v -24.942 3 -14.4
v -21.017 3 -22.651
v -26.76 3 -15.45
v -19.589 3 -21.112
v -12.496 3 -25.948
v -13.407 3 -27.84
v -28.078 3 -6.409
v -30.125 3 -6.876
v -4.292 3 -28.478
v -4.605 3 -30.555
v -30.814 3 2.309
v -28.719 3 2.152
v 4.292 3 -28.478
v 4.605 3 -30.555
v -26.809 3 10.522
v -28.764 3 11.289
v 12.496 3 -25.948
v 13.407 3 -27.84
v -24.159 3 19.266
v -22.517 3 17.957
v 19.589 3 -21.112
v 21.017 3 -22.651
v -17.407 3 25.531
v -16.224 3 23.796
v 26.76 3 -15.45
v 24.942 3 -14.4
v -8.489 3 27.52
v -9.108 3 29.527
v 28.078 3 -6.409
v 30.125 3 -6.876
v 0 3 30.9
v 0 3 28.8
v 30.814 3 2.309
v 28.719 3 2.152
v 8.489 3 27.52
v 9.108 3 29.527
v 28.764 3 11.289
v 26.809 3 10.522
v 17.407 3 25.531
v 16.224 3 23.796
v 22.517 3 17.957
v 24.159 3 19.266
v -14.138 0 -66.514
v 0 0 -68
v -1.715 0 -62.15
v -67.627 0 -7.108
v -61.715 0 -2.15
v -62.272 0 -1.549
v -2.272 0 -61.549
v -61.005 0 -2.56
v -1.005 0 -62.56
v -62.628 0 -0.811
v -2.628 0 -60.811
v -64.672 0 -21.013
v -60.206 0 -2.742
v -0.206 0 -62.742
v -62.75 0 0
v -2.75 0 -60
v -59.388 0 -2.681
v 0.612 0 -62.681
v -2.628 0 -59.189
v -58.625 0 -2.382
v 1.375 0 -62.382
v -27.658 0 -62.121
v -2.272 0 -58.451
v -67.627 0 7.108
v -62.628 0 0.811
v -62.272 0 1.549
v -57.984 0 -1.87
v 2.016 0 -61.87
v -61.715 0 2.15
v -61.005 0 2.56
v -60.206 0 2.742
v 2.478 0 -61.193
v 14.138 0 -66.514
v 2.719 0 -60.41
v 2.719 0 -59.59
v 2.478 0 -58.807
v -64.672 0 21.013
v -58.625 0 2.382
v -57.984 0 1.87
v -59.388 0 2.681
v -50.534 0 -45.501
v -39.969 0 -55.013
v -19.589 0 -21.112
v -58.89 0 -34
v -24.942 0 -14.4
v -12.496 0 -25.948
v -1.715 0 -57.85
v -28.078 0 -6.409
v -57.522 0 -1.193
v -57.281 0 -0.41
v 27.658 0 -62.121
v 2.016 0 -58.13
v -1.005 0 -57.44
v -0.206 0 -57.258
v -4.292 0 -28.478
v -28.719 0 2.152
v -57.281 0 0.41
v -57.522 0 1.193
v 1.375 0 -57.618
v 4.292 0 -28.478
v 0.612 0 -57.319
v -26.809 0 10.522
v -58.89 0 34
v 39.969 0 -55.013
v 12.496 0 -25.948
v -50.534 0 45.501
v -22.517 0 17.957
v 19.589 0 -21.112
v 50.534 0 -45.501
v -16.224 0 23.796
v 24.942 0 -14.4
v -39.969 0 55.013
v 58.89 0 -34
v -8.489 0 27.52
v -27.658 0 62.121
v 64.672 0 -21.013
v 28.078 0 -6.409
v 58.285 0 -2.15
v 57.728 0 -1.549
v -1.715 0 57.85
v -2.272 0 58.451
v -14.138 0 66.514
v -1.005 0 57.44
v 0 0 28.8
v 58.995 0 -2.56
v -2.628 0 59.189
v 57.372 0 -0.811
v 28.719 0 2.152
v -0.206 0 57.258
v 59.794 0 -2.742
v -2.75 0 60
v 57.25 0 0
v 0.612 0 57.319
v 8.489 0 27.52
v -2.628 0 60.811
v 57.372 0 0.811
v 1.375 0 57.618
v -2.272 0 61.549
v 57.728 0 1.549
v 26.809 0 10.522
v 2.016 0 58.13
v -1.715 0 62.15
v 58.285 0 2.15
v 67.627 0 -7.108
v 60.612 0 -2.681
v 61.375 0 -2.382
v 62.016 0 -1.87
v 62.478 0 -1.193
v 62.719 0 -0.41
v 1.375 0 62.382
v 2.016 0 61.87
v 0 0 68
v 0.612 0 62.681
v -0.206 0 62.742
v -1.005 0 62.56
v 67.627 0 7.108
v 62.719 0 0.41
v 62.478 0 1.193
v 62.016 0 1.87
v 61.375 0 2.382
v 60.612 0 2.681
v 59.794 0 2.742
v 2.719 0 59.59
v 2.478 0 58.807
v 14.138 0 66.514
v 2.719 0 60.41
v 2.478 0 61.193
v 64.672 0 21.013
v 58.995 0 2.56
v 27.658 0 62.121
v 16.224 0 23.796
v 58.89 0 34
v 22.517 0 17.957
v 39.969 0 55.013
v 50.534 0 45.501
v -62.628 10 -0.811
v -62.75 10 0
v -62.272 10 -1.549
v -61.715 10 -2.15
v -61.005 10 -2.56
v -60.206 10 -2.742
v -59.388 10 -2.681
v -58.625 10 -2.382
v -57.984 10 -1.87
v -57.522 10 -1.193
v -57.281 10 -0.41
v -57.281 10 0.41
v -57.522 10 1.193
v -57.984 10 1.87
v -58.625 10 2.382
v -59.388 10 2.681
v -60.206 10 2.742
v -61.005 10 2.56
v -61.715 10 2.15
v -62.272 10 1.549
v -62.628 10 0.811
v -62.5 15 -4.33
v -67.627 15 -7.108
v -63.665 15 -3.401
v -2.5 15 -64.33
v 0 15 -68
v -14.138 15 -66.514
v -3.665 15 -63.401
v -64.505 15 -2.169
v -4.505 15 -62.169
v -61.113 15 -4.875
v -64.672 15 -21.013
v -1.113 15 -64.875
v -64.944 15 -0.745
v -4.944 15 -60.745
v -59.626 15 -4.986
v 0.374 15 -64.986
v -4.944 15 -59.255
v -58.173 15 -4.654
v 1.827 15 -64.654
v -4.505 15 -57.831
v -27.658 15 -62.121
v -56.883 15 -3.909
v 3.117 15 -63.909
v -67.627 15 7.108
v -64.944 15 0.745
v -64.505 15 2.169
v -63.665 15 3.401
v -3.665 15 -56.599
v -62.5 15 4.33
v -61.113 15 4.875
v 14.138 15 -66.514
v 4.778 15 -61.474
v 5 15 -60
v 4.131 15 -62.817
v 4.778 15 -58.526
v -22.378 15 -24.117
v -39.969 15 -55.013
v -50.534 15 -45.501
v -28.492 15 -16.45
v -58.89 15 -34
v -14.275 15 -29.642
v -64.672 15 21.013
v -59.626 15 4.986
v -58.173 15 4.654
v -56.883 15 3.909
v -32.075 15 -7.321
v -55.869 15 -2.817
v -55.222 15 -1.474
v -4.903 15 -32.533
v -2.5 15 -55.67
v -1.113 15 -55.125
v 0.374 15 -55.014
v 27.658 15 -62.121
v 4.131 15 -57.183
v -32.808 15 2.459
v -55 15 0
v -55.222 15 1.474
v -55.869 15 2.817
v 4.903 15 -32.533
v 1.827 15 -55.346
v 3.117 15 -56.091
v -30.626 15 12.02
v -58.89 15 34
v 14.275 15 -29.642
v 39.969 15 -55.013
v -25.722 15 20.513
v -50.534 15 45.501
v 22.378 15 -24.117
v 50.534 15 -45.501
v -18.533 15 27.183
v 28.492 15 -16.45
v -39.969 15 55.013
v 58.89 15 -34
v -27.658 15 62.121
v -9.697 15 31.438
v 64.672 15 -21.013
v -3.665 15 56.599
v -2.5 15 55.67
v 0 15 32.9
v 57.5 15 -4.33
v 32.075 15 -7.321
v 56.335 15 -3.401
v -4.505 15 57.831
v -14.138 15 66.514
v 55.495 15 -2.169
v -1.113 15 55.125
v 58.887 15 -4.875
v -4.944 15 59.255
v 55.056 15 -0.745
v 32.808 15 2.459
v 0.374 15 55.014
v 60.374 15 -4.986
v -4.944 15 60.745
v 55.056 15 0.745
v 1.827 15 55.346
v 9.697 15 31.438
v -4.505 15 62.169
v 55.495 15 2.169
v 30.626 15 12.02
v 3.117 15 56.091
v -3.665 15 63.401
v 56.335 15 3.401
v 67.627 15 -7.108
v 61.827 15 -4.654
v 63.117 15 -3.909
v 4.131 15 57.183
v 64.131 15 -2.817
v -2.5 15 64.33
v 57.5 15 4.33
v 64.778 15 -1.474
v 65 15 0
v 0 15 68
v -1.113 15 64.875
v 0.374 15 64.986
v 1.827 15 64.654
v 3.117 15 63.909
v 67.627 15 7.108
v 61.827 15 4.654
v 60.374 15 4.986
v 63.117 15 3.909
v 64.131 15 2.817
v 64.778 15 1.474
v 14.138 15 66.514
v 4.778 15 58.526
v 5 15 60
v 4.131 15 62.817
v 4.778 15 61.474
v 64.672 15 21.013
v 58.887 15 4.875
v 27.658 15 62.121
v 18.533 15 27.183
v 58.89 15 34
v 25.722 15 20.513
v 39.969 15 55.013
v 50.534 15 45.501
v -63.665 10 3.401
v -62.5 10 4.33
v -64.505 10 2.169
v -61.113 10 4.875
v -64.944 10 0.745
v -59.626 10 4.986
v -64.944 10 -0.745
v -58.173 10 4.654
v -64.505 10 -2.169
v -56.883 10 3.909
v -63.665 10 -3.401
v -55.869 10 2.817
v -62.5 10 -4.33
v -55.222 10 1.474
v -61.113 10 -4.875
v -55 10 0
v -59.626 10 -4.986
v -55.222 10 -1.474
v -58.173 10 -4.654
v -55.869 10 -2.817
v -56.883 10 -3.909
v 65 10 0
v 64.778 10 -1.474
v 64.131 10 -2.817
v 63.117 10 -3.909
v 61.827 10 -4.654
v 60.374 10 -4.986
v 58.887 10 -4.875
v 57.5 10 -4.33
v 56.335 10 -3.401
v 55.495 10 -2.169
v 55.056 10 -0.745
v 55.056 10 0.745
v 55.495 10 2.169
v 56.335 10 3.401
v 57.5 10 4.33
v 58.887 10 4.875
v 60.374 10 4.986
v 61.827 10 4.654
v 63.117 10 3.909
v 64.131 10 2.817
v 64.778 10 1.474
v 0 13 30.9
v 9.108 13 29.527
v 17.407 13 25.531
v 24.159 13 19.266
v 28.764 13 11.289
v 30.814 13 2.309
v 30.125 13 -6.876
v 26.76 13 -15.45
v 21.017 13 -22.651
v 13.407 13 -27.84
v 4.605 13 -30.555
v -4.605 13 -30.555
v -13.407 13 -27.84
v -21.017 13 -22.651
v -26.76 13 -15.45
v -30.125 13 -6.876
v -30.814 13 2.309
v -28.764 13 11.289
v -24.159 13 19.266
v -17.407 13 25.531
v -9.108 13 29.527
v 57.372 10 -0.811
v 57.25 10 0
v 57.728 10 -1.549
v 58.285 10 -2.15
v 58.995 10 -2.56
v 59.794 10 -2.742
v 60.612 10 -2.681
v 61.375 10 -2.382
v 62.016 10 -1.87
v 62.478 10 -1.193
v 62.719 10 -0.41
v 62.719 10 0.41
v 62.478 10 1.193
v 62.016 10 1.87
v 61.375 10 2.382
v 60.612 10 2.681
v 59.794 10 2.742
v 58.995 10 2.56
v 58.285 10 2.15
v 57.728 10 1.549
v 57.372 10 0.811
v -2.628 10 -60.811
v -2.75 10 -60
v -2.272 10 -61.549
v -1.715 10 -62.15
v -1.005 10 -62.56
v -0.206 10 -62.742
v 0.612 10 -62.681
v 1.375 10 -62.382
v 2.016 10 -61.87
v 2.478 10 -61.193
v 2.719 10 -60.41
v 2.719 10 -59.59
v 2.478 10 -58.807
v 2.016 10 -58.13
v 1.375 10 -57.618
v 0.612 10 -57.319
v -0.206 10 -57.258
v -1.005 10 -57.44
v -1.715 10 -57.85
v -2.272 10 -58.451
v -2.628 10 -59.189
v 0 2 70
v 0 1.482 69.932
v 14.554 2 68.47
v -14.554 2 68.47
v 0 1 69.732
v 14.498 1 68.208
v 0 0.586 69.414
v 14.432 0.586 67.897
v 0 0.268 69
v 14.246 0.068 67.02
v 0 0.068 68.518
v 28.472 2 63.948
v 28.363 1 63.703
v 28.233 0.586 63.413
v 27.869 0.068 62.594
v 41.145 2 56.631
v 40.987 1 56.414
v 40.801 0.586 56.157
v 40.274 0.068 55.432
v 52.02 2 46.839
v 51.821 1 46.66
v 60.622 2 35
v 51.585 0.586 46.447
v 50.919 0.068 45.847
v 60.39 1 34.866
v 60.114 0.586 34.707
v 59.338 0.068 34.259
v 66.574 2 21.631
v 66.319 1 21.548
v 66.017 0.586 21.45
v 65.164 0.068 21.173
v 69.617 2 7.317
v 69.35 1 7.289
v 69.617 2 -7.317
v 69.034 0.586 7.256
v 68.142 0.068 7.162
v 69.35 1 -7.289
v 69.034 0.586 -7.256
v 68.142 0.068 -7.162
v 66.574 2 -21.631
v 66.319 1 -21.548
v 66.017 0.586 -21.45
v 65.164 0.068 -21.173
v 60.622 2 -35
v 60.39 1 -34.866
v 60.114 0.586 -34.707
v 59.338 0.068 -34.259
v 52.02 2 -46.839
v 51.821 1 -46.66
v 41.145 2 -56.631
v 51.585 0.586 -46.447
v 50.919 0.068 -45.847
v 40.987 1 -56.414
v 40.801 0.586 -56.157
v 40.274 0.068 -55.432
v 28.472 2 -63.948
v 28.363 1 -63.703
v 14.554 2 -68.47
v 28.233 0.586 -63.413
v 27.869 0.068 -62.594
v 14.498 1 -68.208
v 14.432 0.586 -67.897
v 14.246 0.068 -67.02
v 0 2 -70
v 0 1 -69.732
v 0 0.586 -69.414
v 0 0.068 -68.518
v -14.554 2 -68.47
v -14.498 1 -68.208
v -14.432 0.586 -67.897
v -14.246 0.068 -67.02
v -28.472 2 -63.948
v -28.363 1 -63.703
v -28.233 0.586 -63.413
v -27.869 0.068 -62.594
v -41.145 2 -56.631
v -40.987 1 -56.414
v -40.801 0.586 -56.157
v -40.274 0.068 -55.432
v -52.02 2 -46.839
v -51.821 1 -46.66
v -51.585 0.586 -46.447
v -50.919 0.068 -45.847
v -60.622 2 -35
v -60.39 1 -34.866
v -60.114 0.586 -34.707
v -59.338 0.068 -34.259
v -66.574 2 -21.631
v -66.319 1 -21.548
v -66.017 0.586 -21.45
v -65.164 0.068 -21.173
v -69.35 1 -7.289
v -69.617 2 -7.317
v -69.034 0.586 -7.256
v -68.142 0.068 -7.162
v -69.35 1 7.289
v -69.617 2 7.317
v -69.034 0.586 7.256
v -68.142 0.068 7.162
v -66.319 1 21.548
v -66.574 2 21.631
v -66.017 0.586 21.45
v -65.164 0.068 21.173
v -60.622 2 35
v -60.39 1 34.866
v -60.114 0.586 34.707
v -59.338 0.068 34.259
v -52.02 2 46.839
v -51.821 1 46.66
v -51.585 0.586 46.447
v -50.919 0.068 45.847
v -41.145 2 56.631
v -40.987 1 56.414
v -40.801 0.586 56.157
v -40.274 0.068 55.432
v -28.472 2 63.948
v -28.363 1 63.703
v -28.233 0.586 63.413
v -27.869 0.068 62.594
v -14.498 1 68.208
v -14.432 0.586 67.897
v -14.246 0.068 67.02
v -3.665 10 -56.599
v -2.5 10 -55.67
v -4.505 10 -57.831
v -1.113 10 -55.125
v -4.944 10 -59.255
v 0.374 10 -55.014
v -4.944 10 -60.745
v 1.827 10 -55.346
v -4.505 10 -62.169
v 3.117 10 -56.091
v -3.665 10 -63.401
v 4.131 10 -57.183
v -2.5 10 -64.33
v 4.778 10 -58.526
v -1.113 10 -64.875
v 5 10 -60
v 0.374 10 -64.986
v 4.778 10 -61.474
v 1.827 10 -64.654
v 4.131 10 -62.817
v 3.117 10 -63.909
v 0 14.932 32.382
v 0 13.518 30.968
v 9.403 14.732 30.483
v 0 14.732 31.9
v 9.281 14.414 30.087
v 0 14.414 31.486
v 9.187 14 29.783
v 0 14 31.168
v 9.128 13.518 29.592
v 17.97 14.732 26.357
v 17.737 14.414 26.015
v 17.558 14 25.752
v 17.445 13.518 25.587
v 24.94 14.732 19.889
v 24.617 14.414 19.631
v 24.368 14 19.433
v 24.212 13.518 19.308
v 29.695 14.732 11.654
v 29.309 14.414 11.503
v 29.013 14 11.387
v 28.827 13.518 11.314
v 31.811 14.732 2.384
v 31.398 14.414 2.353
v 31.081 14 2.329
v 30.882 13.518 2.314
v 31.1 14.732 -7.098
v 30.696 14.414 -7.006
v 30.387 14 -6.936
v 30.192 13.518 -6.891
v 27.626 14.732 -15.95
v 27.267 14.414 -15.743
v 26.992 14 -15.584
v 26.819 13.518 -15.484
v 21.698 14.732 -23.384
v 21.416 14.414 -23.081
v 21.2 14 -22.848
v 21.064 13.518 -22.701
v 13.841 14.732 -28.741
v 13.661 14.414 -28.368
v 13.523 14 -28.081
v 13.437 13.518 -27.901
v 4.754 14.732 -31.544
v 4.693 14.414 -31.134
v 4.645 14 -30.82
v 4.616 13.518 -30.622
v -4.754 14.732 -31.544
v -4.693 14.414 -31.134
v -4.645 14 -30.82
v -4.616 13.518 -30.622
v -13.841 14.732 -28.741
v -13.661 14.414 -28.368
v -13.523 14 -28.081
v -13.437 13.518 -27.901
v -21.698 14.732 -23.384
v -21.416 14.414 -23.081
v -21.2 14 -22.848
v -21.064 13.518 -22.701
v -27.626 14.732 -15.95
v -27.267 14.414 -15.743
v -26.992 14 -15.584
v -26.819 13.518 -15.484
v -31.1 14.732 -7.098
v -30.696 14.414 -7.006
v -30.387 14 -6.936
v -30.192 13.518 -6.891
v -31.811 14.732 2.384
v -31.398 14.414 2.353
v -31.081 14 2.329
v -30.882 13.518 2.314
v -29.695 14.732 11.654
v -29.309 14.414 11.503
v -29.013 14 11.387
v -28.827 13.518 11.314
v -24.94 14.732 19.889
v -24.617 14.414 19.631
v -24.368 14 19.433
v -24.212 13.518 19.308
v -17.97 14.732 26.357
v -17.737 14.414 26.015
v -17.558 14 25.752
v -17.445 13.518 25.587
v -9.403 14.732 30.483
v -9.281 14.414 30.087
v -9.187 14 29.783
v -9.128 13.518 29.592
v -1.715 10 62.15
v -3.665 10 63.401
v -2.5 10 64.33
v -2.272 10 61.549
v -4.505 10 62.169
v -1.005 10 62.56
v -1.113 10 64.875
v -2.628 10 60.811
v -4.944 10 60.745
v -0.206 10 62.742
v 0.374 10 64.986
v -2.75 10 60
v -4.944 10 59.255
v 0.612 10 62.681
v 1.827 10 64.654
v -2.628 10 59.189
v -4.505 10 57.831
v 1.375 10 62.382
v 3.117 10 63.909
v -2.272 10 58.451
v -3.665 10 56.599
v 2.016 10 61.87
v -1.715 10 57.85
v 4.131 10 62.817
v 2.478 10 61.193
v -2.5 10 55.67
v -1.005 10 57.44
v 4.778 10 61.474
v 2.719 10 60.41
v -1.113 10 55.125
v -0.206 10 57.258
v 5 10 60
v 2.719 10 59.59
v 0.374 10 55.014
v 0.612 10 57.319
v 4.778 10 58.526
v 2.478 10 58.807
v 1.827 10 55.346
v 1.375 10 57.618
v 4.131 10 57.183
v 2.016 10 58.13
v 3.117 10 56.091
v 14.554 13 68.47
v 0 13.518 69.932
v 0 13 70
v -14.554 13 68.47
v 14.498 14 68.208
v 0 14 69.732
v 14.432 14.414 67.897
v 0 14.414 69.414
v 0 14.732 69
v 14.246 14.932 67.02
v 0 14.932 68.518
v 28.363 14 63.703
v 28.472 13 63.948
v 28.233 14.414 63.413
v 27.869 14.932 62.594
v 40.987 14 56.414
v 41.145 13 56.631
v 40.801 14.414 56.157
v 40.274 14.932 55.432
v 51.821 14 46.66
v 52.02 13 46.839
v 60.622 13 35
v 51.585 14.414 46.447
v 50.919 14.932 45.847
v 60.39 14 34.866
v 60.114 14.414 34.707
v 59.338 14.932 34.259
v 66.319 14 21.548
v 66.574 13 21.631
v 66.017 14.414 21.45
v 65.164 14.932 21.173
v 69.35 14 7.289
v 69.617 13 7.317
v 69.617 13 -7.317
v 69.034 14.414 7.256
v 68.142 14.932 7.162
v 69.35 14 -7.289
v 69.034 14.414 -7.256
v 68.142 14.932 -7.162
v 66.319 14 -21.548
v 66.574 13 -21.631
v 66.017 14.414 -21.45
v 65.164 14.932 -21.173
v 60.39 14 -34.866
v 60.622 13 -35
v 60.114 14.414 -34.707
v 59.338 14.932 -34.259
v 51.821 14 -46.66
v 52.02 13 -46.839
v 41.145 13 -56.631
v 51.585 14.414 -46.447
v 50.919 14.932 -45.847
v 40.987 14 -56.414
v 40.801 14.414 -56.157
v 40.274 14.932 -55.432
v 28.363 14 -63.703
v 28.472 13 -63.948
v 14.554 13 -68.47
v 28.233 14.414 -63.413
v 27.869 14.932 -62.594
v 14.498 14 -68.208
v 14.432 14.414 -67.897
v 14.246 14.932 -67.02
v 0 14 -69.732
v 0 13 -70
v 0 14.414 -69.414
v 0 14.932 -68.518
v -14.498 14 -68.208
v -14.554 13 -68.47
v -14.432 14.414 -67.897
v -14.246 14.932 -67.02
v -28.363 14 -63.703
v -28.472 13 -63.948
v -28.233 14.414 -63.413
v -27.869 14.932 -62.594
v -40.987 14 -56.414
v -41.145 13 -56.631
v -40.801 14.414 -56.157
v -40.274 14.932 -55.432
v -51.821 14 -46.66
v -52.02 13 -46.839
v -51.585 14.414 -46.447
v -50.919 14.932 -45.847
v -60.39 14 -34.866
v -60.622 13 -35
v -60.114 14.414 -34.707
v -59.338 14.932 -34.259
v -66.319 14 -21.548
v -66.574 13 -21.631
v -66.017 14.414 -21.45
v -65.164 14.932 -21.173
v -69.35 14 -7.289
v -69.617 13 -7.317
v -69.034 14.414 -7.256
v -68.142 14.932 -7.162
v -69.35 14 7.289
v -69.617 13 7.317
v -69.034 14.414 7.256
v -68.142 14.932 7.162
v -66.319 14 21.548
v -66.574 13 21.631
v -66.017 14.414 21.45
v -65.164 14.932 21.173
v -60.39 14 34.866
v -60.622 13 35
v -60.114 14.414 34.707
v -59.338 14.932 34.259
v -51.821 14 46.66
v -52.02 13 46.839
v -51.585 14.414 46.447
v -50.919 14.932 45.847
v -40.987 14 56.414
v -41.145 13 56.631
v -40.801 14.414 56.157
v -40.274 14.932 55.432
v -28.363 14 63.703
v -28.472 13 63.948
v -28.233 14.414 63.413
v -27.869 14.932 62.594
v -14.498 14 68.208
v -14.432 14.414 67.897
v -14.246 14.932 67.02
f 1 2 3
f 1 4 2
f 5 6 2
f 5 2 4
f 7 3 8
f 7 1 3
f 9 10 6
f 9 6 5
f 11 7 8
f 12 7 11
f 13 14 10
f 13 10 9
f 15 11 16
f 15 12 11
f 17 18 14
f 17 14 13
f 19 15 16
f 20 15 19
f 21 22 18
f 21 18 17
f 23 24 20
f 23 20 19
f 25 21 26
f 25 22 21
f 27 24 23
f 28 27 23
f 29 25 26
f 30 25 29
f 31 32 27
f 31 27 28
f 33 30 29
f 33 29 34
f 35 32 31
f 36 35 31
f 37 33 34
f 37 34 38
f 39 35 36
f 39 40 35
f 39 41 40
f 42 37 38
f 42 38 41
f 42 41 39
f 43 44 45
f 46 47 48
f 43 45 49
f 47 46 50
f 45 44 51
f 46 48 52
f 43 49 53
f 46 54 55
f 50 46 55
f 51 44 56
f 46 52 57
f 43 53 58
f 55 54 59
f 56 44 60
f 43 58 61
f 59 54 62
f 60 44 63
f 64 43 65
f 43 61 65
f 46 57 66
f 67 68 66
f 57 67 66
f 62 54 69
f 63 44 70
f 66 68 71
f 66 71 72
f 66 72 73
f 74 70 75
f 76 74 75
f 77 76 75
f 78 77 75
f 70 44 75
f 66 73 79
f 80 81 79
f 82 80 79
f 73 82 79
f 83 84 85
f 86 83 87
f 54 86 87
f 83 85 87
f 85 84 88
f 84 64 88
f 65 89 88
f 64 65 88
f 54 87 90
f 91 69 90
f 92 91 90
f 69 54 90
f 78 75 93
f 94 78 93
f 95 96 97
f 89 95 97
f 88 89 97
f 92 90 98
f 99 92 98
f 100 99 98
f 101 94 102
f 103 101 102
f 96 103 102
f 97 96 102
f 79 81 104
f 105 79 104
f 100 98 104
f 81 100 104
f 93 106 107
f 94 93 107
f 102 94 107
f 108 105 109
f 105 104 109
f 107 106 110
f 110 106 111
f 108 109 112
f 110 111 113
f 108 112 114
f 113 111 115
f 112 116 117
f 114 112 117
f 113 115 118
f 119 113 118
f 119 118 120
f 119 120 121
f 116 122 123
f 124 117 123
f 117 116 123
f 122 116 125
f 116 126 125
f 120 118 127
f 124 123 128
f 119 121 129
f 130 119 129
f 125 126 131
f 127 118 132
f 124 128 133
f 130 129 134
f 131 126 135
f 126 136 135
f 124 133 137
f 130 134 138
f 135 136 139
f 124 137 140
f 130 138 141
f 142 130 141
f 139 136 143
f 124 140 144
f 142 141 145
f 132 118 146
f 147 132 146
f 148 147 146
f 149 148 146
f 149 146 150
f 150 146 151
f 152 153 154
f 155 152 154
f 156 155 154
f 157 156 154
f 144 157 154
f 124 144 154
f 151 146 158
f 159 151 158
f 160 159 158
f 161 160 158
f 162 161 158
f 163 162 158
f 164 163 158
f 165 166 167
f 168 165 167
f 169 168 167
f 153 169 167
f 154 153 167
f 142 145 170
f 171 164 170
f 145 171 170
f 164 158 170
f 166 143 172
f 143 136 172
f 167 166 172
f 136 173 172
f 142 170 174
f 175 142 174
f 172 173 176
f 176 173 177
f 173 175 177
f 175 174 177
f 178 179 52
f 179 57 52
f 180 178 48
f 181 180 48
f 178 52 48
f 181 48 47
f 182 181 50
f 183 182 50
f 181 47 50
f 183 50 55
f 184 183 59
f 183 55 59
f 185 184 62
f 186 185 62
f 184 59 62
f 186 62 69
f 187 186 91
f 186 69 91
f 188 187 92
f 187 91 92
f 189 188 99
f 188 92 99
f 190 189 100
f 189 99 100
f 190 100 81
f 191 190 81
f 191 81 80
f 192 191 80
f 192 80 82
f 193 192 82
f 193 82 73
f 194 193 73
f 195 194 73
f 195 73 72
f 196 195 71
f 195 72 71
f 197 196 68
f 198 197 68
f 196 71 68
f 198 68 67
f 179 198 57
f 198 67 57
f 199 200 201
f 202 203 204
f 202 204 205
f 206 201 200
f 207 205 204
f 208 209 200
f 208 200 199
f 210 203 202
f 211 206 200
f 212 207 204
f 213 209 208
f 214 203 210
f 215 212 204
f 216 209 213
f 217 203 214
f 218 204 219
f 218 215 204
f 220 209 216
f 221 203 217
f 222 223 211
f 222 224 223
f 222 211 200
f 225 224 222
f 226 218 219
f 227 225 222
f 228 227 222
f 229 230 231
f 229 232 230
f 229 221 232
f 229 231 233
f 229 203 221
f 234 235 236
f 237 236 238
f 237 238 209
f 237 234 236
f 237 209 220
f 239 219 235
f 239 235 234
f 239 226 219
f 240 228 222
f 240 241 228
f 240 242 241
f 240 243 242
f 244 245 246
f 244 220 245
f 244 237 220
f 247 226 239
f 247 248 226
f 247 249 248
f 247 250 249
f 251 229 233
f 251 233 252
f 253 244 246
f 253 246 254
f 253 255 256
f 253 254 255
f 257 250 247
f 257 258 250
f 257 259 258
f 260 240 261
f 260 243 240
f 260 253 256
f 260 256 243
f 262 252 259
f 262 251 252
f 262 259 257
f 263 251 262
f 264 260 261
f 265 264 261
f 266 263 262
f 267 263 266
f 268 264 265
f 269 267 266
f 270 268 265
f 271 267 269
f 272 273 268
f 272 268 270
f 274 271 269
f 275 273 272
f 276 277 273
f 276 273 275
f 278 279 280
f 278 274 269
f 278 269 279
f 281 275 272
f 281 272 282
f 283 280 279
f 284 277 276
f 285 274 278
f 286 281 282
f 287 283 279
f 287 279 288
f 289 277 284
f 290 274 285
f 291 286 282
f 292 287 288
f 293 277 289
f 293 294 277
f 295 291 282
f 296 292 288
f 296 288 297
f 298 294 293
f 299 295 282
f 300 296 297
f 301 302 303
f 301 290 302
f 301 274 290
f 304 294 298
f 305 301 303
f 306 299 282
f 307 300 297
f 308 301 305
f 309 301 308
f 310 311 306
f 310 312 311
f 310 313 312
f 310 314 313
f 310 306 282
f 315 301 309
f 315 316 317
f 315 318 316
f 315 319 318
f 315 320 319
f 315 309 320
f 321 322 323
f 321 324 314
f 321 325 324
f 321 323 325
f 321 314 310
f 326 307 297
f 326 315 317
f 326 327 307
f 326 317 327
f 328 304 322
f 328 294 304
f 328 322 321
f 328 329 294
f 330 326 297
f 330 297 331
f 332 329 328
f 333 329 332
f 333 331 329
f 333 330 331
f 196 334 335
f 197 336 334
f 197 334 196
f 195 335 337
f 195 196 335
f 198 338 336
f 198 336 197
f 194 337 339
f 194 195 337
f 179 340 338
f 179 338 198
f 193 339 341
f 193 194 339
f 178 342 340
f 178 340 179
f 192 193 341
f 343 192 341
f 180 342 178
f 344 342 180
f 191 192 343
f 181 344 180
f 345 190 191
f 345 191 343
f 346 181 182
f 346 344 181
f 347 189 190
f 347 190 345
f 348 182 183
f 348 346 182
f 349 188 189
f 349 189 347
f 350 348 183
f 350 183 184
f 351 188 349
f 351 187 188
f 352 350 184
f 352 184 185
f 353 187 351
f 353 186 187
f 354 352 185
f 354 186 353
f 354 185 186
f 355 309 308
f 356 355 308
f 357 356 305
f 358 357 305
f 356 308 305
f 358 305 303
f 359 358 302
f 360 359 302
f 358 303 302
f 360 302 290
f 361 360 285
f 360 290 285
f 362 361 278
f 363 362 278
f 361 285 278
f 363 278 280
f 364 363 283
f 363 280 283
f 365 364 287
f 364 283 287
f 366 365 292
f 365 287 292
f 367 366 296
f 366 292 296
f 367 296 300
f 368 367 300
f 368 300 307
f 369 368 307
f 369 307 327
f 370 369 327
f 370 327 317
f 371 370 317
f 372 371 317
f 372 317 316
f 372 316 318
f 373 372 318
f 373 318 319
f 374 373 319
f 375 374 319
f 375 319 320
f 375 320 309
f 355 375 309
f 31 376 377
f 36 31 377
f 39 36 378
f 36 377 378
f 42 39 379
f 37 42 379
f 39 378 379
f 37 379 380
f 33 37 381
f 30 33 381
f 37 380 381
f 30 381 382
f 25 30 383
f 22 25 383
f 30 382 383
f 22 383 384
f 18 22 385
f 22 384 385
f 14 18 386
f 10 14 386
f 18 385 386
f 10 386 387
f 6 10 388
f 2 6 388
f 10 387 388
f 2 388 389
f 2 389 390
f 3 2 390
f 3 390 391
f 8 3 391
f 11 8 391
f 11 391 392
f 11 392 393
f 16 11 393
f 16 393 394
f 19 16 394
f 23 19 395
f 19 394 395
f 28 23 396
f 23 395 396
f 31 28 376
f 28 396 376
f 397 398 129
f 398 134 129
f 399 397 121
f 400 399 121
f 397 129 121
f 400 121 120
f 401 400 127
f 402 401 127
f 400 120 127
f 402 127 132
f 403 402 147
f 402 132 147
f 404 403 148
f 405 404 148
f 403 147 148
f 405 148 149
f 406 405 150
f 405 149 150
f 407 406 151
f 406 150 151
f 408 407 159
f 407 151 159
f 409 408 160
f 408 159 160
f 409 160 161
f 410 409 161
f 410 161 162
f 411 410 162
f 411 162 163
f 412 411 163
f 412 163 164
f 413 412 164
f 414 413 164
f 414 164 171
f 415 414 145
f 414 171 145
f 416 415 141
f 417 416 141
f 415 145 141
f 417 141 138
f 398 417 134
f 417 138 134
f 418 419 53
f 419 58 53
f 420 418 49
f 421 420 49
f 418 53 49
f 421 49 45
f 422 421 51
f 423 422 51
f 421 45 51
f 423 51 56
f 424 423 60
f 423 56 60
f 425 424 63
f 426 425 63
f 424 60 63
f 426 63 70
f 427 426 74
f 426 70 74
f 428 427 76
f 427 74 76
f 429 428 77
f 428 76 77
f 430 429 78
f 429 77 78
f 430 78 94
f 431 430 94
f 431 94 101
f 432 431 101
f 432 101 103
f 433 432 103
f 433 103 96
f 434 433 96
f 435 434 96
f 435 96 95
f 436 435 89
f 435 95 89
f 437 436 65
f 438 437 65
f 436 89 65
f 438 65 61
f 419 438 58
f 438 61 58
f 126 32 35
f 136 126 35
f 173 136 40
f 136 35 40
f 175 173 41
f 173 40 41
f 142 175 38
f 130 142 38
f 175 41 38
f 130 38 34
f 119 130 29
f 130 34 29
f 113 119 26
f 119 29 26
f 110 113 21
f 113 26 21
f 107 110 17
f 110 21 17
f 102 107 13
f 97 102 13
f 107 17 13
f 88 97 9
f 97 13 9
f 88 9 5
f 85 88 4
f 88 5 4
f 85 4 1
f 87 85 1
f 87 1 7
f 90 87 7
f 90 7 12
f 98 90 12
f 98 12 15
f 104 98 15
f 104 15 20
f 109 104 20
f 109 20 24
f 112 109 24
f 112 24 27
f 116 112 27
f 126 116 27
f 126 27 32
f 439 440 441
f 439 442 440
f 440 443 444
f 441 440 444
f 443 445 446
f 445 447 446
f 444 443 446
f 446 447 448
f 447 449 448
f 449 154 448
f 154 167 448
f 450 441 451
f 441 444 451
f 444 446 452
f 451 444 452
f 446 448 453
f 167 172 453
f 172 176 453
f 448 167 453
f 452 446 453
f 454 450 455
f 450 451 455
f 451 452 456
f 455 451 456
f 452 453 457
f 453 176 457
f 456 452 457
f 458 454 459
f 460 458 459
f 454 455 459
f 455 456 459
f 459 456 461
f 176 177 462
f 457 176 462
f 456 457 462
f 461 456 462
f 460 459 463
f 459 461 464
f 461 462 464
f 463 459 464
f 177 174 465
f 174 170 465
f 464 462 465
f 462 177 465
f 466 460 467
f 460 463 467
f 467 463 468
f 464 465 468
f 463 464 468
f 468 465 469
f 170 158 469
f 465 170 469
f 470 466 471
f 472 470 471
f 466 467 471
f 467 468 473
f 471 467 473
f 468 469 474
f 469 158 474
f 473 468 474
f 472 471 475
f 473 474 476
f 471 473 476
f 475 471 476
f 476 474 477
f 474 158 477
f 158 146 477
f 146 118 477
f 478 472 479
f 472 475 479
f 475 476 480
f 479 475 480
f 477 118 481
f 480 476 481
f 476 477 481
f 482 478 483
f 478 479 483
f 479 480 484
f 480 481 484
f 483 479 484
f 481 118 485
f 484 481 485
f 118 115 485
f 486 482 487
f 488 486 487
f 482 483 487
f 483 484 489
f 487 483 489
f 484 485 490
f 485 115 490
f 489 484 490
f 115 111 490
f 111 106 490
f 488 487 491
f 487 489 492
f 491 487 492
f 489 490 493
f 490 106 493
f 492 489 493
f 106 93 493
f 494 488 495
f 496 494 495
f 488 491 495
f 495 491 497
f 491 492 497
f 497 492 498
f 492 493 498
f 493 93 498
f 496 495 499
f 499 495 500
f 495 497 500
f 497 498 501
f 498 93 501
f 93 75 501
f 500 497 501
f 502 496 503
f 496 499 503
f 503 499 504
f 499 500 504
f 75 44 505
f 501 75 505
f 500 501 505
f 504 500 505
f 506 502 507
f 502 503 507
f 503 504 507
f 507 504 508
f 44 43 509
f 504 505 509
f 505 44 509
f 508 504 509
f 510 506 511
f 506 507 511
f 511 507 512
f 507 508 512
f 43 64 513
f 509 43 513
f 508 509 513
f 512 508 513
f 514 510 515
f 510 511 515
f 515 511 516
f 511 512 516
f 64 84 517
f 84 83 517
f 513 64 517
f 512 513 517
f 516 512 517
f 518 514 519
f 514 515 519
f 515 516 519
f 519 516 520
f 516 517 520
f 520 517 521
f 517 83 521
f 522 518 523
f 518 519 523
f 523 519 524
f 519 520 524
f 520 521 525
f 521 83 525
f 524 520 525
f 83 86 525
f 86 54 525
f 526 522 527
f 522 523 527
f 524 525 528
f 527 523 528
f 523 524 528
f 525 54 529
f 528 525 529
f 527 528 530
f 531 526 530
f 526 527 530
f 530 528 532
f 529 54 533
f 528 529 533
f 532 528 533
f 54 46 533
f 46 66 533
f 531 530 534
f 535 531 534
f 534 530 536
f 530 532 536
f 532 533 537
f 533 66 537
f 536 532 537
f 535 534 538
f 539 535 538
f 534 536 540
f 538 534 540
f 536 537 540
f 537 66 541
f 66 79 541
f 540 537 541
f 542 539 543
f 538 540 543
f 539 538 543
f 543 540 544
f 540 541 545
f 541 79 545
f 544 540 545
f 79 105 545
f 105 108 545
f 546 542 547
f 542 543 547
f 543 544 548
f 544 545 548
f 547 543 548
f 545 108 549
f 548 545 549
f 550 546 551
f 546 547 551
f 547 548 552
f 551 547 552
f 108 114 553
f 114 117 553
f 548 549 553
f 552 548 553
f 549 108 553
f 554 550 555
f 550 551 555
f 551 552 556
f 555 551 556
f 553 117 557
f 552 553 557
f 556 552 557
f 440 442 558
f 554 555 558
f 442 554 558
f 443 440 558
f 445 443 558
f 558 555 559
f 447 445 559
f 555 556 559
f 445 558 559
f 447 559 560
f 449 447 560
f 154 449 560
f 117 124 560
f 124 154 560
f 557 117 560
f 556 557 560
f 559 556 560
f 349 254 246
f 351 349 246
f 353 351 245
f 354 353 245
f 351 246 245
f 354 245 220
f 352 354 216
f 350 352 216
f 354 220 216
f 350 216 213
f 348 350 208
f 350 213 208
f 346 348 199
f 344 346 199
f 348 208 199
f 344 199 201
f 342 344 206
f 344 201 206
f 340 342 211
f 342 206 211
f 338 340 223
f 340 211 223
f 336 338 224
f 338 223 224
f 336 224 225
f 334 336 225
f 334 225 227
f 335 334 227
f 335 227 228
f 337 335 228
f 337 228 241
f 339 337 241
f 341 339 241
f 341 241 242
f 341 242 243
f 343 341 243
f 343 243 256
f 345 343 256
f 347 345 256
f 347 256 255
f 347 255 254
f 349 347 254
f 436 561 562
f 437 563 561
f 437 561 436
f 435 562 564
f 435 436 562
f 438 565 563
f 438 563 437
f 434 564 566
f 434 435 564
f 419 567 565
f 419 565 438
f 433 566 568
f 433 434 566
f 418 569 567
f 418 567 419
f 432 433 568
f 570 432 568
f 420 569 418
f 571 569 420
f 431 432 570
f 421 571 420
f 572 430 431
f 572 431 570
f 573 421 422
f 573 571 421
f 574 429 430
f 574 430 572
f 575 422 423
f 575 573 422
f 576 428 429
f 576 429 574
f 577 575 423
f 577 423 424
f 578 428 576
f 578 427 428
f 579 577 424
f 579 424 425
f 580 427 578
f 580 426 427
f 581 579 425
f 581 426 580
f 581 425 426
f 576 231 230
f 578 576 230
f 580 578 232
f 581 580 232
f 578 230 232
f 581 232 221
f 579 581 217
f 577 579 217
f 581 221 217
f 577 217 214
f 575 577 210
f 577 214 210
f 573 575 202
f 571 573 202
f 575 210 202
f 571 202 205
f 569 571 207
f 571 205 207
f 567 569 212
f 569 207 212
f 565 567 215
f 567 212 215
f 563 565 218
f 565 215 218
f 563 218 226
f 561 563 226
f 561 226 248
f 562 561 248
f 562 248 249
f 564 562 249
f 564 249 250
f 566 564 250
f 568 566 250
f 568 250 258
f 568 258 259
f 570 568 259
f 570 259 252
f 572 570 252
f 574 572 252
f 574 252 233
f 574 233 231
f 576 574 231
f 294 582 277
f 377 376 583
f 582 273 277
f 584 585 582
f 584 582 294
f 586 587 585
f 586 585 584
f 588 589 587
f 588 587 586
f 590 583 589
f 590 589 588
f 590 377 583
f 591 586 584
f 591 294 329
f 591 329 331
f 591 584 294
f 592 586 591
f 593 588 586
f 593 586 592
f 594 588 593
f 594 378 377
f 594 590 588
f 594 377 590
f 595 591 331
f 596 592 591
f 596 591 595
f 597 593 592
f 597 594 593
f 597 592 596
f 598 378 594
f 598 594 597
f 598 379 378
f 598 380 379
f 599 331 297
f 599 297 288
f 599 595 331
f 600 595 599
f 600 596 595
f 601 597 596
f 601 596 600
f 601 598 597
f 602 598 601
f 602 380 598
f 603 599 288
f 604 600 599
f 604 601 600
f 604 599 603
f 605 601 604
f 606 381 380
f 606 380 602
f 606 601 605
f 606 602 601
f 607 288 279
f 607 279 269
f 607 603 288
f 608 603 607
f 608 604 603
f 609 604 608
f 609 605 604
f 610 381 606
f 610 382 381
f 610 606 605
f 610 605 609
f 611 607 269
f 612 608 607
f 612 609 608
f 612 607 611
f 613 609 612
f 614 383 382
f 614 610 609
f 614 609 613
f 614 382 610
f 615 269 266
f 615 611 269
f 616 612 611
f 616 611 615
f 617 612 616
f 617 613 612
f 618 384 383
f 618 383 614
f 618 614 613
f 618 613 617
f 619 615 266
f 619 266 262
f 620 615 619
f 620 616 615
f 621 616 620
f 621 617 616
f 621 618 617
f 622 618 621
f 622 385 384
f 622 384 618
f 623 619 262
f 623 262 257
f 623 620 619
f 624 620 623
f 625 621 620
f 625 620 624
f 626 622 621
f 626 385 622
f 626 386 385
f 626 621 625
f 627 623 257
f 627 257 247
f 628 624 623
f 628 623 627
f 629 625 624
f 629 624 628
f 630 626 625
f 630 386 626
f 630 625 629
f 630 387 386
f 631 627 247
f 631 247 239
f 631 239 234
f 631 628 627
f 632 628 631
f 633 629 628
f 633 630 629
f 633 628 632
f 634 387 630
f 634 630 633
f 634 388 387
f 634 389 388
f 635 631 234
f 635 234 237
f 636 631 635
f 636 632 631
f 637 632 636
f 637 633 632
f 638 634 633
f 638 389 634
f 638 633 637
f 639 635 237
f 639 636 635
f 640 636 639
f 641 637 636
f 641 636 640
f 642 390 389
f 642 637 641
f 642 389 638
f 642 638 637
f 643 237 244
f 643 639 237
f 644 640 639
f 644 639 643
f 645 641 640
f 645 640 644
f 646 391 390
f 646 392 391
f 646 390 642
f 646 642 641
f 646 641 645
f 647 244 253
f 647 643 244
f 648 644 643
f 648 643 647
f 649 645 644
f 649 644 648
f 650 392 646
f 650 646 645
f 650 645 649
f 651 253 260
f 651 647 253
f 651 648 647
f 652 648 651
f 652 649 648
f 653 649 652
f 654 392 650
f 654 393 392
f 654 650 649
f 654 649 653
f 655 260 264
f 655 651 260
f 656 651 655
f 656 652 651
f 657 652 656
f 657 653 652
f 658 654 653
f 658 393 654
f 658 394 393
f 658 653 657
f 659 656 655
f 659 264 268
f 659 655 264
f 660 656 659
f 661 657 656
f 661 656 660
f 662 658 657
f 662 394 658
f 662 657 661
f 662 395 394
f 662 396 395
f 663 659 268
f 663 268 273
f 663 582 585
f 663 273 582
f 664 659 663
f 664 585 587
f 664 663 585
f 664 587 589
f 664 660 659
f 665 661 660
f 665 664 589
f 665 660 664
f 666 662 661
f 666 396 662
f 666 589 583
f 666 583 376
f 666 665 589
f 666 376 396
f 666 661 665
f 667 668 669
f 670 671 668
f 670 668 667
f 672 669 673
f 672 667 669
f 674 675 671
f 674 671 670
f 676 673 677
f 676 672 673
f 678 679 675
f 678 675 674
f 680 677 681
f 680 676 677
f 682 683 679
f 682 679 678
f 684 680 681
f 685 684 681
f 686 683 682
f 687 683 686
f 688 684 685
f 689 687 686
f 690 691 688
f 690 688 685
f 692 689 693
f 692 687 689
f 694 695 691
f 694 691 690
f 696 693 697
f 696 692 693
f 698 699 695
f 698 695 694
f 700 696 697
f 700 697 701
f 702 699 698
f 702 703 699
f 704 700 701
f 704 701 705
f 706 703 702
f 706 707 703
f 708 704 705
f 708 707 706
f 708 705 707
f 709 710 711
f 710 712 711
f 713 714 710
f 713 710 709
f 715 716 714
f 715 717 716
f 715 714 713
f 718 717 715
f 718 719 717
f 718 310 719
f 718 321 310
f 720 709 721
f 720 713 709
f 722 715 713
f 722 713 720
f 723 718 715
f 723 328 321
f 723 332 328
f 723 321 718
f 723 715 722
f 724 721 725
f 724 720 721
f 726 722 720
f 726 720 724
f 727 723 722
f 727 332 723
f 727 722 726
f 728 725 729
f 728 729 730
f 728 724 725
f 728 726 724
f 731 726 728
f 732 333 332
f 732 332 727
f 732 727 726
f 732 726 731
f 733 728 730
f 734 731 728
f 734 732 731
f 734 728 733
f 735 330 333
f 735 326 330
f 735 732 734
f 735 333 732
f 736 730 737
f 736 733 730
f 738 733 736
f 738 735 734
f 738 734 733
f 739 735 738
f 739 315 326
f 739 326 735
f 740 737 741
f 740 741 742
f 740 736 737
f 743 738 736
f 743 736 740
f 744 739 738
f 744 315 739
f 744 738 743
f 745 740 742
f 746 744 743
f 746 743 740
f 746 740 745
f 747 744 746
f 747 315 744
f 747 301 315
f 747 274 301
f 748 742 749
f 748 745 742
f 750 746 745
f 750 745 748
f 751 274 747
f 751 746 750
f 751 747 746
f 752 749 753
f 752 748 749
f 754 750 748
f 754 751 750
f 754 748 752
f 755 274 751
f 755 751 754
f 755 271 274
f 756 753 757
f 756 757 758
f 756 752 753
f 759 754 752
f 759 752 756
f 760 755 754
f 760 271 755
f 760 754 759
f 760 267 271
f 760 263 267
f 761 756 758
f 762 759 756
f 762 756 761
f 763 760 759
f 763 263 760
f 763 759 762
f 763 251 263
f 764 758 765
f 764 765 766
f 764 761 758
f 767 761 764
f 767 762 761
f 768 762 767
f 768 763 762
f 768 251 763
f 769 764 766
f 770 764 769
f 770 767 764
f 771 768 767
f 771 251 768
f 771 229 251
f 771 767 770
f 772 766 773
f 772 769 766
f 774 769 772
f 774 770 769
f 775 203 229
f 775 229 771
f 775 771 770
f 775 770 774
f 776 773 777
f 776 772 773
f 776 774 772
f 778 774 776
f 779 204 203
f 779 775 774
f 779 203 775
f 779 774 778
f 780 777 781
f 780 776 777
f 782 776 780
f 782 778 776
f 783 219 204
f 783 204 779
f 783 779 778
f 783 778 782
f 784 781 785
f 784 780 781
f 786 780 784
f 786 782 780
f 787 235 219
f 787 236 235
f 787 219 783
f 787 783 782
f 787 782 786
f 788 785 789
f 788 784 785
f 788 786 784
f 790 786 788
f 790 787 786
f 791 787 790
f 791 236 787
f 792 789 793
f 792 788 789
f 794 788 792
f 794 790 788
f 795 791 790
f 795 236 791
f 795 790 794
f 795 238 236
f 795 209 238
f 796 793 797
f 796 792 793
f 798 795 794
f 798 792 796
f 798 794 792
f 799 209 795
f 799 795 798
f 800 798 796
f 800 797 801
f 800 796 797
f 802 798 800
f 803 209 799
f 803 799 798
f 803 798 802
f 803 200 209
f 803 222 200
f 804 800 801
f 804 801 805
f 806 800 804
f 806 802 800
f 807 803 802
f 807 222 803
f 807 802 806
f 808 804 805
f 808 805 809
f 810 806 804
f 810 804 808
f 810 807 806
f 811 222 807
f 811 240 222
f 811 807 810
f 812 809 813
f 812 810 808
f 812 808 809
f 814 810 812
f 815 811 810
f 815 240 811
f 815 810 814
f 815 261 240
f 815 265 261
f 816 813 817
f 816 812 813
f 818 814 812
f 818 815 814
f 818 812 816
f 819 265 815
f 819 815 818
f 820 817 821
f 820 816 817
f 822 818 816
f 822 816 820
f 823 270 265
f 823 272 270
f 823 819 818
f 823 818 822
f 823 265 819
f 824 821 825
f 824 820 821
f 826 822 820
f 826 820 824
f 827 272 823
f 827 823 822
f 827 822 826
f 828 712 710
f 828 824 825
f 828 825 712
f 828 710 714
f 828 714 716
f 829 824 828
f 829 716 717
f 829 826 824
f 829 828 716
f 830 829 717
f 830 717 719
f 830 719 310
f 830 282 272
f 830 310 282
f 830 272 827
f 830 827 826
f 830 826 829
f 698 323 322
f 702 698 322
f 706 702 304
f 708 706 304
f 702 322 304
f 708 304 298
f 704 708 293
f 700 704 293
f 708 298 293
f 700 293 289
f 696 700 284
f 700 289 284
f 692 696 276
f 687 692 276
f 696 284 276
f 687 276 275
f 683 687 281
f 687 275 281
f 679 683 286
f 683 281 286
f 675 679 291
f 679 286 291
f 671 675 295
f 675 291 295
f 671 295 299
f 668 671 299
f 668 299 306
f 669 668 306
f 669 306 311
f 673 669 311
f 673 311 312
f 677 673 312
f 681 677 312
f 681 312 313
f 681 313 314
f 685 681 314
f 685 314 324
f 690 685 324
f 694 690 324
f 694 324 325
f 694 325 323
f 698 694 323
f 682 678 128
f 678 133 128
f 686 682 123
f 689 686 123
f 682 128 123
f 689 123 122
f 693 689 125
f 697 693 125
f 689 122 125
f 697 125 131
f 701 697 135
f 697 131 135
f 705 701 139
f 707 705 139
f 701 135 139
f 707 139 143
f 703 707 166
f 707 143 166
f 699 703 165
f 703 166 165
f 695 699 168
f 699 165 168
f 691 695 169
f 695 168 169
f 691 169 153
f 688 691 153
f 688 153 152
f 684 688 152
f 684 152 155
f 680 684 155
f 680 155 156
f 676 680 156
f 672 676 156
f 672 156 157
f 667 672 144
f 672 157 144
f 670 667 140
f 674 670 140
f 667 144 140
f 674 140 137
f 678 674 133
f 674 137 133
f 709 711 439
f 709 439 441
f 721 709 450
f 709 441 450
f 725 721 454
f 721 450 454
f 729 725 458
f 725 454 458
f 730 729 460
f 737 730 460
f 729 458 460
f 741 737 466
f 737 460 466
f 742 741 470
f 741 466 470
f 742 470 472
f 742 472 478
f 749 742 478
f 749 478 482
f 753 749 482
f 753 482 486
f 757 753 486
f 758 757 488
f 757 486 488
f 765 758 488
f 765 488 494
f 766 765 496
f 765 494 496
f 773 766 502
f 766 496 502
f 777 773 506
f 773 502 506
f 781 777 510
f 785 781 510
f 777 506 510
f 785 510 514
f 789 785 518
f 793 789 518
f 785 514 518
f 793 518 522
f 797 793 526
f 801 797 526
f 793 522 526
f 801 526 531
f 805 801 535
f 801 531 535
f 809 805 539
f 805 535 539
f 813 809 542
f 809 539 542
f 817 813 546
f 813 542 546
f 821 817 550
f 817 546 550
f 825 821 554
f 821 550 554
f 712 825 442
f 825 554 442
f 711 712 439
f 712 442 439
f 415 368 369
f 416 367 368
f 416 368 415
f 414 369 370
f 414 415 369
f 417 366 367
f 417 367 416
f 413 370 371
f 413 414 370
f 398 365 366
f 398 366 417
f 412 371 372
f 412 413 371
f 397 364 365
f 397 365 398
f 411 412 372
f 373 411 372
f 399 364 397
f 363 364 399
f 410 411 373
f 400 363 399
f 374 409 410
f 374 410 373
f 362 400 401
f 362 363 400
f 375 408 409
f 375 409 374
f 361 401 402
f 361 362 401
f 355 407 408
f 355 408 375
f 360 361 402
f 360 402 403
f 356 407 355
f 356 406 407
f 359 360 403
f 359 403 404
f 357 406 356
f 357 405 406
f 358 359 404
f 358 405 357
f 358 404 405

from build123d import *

# Parameters (mm, degrees)
SKETCH2_R                      = 70
BOSS_EXTRUDE1_DEPTH            = 15
SKETCH5_R                      = 30.9
CUT_EXTRUDE1_DEPTH             = 12
SKETCH6_R                      = 28.8
CUT_EXTRUDE2_DEPTH             = 100.719606899
FILLET1_R                      = 2
CBORE_FOR_M5_SHCS1_D           = 5.5
CBORE_FOR_M5_SHCS1_CBORE_D     = 10
CBORE_FOR_M5_SHCS1_CBORE_DEPTH = 5


with BuildPart() as part:
    # Sketch2 → Boss-Extrude1 (new body)
    with BuildSketch(Plane(origin=(0, 0, 0), x_dir=(1, 0, 0), z_dir=(0, 1, 0))):
        with Locations(Location((0, 0, 0), (0, 0, 270))):
            Circle(SKETCH2_R)
    extrude(amount=BOSS_EXTRUDE1_DEPTH)

    # Sketch5 → Cut-Extrude1 (cut)
    with BuildSketch(Plane(origin=(0, 15, 0), x_dir=(1, 0, 0), z_dir=(0, 1, 0))):
        with Locations(Location((0, 0, 0), (0, 0, 270))):
            Circle(SKETCH5_R)
    extrude(amount=-CUT_EXTRUDE1_DEPTH, mode=Mode.SUBTRACT)

    # Sketch6 → Cut-Extrude2 (cut, through all)
    with BuildSketch(Plane(origin=(0, 3, 0), x_dir=(1, 0, 0), z_dir=(0, 1, 0))):
        with Locations(Location((0, 0, 0), (0, 0, 270))):
            Circle(SKETCH6_R)
    extrude(amount=-CUT_EXTRUDE2_DEPTH, mode=Mode.SUBTRACT)

    # Fillet1
    fillet1_edges = [part.edges().sort_by_distance(p)[0] for p in [
        (0, 0, -70),
        (0, 15, -70),
        (0, 15, -30.9),
    ]]
    fillet(fillet1_edges, radius=FILLET1_R)

    # CBORE for M5 SHCS1 (through all)
    with Locations(Plane(origin=(0, 15, 0), x_dir=(1, 0, 0), z_dir=(0, 1, 0))):
        with Locations((0, 60), (60, 0), (-60, 0), (0, -60)):
            CounterBoreHole(CBORE_FOR_M5_SHCS1_D / 2, CBORE_FOR_M5_SHCS1_CBORE_D / 2, CBORE_FOR_M5_SHCS1_CBORE_DEPTH)


solid = part.part
